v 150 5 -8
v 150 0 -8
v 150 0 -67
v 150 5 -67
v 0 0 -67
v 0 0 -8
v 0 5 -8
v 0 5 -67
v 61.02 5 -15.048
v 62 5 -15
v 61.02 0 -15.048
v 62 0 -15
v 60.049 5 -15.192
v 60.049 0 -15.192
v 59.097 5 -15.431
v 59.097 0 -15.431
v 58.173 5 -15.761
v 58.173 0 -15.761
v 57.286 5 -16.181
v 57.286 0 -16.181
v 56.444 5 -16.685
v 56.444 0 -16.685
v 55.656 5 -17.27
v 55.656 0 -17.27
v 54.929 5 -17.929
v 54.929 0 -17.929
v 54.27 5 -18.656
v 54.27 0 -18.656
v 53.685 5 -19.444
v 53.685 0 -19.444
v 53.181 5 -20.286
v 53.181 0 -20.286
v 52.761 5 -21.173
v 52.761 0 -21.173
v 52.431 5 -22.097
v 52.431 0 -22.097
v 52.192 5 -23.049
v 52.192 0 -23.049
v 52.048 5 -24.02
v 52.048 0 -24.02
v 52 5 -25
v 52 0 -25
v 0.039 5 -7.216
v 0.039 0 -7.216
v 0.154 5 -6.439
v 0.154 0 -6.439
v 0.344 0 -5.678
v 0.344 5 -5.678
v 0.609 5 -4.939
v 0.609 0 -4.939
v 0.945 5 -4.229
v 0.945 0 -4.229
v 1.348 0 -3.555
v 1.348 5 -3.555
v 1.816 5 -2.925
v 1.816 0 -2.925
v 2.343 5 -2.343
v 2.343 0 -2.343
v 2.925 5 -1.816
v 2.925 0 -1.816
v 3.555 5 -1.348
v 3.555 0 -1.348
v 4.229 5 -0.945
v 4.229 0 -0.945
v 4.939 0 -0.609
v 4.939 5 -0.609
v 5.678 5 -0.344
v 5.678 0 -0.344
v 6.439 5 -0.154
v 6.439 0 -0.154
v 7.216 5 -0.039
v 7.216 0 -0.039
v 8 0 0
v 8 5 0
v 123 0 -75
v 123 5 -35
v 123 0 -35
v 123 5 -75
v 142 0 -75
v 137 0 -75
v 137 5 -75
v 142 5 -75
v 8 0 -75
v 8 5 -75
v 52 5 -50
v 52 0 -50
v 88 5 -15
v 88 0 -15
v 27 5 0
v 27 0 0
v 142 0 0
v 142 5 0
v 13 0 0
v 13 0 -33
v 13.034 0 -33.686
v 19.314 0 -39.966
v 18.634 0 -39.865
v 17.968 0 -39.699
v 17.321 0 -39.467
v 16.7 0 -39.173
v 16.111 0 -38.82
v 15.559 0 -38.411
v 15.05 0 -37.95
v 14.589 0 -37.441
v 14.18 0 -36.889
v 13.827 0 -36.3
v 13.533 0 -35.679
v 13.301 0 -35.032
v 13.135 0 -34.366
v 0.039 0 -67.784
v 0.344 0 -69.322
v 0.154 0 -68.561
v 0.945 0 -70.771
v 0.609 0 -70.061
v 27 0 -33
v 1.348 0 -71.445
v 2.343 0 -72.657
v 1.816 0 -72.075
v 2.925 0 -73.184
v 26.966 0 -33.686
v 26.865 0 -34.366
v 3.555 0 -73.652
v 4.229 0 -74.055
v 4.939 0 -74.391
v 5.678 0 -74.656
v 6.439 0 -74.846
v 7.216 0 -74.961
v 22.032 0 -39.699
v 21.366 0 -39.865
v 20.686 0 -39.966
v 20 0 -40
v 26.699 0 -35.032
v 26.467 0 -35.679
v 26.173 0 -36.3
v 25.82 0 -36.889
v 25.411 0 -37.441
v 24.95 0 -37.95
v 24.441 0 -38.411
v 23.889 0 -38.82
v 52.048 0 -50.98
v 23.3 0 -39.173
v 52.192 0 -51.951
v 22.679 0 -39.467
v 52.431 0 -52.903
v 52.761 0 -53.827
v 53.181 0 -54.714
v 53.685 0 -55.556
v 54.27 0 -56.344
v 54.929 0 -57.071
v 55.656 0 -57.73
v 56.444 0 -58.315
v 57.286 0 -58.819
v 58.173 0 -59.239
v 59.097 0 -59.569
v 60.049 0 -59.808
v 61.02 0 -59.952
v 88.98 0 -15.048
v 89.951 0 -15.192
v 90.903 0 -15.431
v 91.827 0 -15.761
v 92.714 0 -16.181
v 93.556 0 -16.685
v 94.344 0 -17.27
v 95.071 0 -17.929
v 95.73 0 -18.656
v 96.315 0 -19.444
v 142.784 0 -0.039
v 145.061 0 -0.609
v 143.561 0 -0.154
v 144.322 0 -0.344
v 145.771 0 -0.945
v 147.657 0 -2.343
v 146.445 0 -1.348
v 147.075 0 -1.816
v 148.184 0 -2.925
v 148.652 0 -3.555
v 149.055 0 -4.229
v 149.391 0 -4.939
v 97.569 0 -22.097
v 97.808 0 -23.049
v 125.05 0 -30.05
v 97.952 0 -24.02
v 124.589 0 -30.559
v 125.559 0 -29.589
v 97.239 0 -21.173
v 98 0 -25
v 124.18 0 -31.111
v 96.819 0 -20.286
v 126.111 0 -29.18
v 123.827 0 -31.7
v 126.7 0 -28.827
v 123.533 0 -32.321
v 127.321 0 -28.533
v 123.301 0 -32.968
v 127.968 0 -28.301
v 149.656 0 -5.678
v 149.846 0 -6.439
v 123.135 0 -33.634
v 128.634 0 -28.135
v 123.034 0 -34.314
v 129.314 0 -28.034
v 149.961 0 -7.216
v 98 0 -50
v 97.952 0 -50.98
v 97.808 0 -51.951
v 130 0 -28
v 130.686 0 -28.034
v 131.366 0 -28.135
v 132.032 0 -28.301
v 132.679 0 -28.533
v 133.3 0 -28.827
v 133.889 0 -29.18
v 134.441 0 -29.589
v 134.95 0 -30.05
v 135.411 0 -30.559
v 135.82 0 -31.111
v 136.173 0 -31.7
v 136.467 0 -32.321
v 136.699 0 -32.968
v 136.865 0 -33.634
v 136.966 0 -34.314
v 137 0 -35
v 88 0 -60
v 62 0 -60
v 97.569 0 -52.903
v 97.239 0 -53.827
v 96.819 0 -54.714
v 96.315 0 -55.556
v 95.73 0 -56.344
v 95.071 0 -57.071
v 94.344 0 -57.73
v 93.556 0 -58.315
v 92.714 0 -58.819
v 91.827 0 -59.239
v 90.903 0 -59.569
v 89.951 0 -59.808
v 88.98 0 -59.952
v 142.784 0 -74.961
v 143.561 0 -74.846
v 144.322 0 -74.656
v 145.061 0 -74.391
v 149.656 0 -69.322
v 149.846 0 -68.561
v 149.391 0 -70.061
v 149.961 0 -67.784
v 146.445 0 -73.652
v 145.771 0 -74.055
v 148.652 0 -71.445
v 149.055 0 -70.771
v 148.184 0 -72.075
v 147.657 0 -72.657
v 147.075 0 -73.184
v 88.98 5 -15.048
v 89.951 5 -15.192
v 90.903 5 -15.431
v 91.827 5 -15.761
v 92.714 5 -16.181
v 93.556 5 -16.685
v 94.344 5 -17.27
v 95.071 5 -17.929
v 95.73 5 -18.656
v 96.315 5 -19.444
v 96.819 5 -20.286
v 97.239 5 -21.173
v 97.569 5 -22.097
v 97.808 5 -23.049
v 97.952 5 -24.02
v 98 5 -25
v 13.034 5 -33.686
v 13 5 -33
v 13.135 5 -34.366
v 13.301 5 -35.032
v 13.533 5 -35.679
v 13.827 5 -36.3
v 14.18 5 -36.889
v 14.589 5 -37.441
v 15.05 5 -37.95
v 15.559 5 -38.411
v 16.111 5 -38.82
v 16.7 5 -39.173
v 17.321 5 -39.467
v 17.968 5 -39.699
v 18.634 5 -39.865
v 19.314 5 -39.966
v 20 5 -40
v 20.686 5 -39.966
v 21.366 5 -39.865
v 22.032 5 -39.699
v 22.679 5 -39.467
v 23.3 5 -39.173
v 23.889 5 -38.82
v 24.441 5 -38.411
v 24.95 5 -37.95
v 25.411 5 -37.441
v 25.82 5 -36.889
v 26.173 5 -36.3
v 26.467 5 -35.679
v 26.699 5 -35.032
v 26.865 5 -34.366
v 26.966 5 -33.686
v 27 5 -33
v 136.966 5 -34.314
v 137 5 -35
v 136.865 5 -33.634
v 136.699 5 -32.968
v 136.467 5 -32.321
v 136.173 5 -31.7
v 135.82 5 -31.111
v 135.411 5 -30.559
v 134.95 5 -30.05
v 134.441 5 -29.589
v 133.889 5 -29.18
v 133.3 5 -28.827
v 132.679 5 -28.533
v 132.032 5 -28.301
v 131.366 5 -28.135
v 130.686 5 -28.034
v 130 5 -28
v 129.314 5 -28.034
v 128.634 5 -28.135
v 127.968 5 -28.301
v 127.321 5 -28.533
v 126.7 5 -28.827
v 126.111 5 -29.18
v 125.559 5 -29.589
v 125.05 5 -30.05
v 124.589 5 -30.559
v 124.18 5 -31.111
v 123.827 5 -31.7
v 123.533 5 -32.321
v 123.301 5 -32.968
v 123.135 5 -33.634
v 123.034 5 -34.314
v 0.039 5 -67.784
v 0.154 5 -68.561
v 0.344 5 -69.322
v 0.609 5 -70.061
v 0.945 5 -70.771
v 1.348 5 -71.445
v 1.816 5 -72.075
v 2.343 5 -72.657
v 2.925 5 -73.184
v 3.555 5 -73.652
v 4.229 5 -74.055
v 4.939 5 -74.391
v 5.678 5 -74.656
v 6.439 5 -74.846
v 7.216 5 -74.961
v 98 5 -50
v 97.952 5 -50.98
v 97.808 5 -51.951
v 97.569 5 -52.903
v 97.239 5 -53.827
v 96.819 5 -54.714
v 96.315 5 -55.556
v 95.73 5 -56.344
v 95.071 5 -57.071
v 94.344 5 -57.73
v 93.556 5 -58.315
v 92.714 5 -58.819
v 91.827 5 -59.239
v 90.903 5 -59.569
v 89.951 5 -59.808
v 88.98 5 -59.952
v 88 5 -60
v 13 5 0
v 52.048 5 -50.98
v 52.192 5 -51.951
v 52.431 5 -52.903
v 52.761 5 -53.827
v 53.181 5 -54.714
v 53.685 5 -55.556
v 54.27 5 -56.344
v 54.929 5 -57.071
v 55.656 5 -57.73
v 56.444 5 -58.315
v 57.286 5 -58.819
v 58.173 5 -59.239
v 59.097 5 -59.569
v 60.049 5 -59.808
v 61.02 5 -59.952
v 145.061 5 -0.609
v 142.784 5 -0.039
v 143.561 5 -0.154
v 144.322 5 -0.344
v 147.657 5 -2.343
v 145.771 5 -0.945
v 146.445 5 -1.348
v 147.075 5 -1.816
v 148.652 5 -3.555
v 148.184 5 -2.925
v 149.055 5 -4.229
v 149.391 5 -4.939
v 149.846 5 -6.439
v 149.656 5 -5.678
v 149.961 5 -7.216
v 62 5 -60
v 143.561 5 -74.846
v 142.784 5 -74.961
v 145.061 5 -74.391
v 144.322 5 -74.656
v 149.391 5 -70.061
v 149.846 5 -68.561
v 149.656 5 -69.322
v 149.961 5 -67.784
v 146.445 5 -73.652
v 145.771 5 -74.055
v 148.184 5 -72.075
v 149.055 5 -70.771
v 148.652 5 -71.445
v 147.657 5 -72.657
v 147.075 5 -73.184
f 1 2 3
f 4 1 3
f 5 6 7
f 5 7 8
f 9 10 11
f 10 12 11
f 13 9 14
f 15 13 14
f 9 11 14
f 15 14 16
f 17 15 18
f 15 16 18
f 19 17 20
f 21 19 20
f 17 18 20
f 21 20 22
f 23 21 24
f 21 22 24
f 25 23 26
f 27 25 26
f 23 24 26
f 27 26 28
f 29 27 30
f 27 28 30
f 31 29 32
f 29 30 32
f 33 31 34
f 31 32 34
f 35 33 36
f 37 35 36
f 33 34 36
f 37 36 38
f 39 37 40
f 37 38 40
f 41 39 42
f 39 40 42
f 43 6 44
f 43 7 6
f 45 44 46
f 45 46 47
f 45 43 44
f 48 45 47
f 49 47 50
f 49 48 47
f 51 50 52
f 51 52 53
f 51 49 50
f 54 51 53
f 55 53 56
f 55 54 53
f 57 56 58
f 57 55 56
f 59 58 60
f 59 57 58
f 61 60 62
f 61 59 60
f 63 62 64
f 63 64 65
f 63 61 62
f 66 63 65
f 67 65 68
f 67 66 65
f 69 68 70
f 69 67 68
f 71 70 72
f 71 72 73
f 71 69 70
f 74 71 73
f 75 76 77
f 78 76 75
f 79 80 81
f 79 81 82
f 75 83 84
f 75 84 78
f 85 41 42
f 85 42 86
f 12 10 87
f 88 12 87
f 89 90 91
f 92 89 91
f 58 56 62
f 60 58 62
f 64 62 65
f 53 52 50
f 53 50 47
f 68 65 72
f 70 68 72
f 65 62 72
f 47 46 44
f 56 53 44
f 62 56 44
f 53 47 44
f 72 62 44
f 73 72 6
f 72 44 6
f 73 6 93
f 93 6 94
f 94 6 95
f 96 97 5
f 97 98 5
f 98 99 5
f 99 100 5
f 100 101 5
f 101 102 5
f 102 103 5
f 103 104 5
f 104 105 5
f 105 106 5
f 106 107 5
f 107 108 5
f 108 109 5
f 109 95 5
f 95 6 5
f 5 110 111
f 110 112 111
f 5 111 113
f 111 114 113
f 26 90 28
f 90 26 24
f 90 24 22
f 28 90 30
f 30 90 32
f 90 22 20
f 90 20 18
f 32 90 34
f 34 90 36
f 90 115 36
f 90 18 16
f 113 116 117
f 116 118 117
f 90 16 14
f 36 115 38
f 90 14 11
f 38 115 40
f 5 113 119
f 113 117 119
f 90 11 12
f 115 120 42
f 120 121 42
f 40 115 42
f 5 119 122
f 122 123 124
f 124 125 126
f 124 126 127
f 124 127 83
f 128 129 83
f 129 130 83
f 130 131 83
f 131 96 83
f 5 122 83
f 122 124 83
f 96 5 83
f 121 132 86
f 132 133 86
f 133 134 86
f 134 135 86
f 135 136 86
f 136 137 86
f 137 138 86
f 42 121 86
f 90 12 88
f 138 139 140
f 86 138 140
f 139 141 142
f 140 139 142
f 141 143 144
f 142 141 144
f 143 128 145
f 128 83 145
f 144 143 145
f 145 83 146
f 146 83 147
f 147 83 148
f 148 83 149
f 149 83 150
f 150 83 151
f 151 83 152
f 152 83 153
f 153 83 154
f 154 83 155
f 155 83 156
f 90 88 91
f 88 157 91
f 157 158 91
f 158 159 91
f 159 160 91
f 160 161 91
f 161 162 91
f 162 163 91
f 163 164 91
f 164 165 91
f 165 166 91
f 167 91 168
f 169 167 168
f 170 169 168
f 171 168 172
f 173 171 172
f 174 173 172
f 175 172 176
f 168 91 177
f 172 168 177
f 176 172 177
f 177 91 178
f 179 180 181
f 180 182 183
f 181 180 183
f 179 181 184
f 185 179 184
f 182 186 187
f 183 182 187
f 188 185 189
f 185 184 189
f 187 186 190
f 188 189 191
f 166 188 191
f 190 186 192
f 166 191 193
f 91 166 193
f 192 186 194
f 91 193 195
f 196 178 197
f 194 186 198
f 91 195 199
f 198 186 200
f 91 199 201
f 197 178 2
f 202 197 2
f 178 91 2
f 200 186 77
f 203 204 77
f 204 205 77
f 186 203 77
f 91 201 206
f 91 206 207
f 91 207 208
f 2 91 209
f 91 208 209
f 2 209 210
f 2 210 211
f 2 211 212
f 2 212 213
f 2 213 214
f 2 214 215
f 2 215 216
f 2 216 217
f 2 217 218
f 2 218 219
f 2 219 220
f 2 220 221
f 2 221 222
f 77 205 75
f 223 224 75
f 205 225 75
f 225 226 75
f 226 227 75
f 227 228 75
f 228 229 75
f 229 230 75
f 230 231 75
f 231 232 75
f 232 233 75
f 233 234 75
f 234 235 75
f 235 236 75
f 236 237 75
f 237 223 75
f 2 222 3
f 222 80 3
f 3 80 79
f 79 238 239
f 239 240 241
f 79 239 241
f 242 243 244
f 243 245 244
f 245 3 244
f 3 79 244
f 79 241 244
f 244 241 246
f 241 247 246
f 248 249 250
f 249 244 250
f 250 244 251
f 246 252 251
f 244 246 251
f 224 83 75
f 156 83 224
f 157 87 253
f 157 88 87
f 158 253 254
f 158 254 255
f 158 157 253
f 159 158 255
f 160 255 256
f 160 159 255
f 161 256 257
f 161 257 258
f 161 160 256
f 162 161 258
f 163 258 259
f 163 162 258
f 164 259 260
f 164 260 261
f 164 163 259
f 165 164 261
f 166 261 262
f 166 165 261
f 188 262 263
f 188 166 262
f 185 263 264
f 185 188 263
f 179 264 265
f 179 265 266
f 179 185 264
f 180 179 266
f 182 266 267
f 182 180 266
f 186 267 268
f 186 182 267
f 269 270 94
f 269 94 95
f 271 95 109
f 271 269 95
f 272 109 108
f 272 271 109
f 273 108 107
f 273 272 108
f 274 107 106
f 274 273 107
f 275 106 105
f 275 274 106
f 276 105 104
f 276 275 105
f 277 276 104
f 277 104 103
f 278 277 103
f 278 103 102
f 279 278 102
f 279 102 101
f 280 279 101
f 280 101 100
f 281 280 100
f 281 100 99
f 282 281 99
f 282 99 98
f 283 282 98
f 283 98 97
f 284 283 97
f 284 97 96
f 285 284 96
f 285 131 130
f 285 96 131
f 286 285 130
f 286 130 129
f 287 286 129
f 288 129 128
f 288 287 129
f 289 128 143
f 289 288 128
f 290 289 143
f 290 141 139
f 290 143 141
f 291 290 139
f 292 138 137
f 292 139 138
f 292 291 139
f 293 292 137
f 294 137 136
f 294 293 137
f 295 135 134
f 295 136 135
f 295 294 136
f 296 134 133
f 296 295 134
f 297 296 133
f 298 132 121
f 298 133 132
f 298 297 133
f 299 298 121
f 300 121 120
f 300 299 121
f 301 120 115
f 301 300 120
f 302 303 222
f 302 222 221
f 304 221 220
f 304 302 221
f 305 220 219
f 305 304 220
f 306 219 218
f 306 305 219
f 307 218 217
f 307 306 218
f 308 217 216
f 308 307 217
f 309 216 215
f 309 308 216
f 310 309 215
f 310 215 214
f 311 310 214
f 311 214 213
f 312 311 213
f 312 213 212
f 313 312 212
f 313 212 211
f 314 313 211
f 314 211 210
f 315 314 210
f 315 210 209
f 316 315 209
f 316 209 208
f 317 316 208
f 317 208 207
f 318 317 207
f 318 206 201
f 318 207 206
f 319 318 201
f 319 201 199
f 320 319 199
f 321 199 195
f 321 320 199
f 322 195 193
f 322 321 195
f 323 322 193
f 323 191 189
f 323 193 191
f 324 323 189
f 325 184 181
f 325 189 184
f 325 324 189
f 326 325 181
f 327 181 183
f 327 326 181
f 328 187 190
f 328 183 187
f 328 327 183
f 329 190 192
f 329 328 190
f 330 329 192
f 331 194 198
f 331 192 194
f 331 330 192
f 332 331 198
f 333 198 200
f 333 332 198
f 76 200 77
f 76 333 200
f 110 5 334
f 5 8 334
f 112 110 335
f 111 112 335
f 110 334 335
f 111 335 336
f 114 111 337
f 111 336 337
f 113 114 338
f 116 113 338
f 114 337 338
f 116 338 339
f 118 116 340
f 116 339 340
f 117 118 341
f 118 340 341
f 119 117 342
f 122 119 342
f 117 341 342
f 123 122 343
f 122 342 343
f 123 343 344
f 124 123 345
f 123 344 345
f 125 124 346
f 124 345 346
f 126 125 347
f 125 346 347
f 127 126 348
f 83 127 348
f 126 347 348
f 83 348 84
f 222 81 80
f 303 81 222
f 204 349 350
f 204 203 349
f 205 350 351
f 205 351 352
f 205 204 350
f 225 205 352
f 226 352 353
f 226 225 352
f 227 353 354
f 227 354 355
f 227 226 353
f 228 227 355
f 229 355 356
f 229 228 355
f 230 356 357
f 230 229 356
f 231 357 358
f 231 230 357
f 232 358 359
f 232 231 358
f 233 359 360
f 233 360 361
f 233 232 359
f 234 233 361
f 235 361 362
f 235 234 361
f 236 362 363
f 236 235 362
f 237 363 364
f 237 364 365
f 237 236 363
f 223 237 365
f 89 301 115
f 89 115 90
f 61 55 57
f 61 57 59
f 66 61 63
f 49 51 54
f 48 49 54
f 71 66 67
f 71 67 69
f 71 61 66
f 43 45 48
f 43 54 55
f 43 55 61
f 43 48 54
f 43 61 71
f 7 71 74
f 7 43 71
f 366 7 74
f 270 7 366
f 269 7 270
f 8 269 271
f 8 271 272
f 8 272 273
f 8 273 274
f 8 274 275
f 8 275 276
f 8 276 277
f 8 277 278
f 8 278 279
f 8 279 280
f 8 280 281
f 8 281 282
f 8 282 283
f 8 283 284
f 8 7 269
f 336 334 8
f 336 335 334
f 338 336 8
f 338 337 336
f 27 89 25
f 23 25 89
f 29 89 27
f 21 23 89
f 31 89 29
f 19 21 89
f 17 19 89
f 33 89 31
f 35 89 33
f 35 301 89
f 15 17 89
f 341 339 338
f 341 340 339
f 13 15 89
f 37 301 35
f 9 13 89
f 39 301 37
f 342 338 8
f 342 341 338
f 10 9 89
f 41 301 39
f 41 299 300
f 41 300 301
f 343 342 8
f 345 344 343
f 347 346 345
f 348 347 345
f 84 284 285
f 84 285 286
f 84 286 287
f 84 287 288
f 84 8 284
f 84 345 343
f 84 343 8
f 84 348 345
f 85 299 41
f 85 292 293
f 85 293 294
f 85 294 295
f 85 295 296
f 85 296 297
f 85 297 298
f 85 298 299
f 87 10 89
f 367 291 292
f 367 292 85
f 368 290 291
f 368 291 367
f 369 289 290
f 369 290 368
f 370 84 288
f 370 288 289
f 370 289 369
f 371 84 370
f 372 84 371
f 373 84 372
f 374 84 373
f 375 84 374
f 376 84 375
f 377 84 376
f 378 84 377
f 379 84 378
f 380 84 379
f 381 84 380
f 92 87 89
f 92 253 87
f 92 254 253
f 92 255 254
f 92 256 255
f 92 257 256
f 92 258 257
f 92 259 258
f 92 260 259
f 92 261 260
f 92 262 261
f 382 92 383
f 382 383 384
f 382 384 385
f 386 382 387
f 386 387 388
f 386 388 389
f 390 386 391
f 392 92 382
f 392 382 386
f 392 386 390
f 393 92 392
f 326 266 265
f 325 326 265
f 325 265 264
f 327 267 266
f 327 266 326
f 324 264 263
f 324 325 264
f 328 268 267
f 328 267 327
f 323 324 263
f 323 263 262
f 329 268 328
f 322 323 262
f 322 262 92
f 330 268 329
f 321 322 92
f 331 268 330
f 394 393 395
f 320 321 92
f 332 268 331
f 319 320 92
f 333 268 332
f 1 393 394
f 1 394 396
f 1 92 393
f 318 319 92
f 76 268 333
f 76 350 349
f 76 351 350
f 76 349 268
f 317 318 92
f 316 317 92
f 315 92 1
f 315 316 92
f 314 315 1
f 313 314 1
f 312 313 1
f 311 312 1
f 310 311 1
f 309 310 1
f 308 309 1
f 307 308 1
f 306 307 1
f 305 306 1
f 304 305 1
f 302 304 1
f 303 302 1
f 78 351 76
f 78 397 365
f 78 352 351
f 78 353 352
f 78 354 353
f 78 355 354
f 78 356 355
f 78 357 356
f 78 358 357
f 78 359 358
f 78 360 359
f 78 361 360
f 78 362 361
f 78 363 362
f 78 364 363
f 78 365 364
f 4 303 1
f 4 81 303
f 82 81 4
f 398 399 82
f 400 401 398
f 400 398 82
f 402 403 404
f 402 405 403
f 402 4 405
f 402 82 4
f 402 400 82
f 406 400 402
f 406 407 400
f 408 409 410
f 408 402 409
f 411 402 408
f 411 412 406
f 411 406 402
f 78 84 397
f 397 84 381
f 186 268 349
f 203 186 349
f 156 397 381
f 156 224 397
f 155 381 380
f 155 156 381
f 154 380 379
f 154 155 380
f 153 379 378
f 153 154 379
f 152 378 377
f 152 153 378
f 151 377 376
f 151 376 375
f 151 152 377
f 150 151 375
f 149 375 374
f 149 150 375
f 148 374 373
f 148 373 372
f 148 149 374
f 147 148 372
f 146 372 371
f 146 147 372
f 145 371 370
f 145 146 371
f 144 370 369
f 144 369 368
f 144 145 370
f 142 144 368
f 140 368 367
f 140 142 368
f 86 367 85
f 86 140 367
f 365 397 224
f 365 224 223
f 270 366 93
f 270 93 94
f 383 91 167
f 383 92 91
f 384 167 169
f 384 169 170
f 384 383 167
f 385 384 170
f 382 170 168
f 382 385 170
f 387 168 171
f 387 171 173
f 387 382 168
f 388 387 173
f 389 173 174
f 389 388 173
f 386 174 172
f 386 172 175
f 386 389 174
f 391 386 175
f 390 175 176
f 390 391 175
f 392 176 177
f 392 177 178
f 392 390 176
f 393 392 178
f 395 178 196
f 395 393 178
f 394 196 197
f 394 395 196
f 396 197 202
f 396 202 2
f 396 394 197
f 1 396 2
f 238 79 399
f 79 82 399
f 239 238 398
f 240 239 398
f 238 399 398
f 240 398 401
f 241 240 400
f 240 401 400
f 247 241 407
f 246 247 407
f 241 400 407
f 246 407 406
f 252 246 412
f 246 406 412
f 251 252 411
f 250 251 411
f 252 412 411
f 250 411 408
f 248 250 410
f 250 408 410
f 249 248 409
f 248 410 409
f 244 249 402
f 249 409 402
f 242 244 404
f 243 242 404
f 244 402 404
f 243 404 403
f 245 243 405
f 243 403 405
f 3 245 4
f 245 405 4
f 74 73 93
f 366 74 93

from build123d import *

# Parameters (mm, degrees)
SKETCH1_W           = 150
SKETCH1_H           = 75
BOSS_EXTRUDE1_DEPTH = 5
CUT_EXTRUDE1_DEPTH  = 168.779617356
CUT_EXTRUDE2_DEPTH  = 168.779617356
SKETCH4_W           = 46
SKETCH4_H           = 45
CUT_EXTRUDE3_DEPTH  = 168.779617356
FILLET1_R           = 10
FILLET2_R           = 8


with BuildPart() as part:
    # Sketch1 → Boss-Extrude1 (new body)
    with BuildSketch(Plane(origin=(0, 0, 0), x_dir=(1, 0, 0), z_dir=(0, 1, 0))):
        with Locations((75, 37.5)):
            Rectangle(SKETCH1_W, SKETCH1_H)
    extrude(amount=BOSS_EXTRUDE1_DEPTH)

    # Sketch2 → Cut-Extrude1 (cut, through all)
    with BuildSketch(Plane(origin=(0, 5, 0), x_dir=(1, 0, 0), z_dir=(0, 1, 0))):
        with BuildLine():
            Line((13, 0), (13, 33))
            ThreePointArc((13, 33), (20, 40), (27, 33))
            Line((27, 33), (27, 0))
            Line((27, 0), (13, 0))
        make_face()
    extrude(amount=-CUT_EXTRUDE1_DEPTH, mode=Mode.SUBTRACT)

    # Sketch3 → Cut-Extrude2 (cut, through all)
    with BuildSketch(Plane(origin=(0, 5, 0), x_dir=(1, 0, 0), z_dir=(0, 1, 0))):
        with BuildLine():
            Line((137, 75), (137, 35))
            ThreePointArc((137, 35), (130, 28), (123, 35))
            Line((123, 35), (123, 75))
            Line((123, 75), (137, 75))
        make_face()
    extrude(amount=-CUT_EXTRUDE2_DEPTH, mode=Mode.SUBTRACT)

    # Sketch4 → Cut-Extrude3 (cut, through all)
    with BuildSketch(Plane(origin=(0, 5, 0), x_dir=(1, 0, 0), z_dir=(0, 1, 0))):
        with Locations((75, 37.5)):
            Rectangle(SKETCH4_W, SKETCH4_H)
    extrude(amount=-CUT_EXTRUDE3_DEPTH, mode=Mode.SUBTRACT)

    # Fillet1
    fillet1_edges = [part.edges().sort_by_distance(p)[0] for p in [
        (52, 2.5, -15),
        (52, 2.5, -60),
        (98, 2.5, -60),
        (98, 2.5, -15),
    ]]
    fillet(fillet1_edges, radius=FILLET1_R)

    # Fillet2
    fillet2_edges = [part.edges().sort_by_distance(p)[0] for p in [
        (0, 2.5, -75),
        (150, 2.5, -75),
        (150, 2.5, 0),
        (0, 2.5, 0),
    ]]
    fillet(fillet2_edges, radius=FILLET2_R)


solid = part.part
